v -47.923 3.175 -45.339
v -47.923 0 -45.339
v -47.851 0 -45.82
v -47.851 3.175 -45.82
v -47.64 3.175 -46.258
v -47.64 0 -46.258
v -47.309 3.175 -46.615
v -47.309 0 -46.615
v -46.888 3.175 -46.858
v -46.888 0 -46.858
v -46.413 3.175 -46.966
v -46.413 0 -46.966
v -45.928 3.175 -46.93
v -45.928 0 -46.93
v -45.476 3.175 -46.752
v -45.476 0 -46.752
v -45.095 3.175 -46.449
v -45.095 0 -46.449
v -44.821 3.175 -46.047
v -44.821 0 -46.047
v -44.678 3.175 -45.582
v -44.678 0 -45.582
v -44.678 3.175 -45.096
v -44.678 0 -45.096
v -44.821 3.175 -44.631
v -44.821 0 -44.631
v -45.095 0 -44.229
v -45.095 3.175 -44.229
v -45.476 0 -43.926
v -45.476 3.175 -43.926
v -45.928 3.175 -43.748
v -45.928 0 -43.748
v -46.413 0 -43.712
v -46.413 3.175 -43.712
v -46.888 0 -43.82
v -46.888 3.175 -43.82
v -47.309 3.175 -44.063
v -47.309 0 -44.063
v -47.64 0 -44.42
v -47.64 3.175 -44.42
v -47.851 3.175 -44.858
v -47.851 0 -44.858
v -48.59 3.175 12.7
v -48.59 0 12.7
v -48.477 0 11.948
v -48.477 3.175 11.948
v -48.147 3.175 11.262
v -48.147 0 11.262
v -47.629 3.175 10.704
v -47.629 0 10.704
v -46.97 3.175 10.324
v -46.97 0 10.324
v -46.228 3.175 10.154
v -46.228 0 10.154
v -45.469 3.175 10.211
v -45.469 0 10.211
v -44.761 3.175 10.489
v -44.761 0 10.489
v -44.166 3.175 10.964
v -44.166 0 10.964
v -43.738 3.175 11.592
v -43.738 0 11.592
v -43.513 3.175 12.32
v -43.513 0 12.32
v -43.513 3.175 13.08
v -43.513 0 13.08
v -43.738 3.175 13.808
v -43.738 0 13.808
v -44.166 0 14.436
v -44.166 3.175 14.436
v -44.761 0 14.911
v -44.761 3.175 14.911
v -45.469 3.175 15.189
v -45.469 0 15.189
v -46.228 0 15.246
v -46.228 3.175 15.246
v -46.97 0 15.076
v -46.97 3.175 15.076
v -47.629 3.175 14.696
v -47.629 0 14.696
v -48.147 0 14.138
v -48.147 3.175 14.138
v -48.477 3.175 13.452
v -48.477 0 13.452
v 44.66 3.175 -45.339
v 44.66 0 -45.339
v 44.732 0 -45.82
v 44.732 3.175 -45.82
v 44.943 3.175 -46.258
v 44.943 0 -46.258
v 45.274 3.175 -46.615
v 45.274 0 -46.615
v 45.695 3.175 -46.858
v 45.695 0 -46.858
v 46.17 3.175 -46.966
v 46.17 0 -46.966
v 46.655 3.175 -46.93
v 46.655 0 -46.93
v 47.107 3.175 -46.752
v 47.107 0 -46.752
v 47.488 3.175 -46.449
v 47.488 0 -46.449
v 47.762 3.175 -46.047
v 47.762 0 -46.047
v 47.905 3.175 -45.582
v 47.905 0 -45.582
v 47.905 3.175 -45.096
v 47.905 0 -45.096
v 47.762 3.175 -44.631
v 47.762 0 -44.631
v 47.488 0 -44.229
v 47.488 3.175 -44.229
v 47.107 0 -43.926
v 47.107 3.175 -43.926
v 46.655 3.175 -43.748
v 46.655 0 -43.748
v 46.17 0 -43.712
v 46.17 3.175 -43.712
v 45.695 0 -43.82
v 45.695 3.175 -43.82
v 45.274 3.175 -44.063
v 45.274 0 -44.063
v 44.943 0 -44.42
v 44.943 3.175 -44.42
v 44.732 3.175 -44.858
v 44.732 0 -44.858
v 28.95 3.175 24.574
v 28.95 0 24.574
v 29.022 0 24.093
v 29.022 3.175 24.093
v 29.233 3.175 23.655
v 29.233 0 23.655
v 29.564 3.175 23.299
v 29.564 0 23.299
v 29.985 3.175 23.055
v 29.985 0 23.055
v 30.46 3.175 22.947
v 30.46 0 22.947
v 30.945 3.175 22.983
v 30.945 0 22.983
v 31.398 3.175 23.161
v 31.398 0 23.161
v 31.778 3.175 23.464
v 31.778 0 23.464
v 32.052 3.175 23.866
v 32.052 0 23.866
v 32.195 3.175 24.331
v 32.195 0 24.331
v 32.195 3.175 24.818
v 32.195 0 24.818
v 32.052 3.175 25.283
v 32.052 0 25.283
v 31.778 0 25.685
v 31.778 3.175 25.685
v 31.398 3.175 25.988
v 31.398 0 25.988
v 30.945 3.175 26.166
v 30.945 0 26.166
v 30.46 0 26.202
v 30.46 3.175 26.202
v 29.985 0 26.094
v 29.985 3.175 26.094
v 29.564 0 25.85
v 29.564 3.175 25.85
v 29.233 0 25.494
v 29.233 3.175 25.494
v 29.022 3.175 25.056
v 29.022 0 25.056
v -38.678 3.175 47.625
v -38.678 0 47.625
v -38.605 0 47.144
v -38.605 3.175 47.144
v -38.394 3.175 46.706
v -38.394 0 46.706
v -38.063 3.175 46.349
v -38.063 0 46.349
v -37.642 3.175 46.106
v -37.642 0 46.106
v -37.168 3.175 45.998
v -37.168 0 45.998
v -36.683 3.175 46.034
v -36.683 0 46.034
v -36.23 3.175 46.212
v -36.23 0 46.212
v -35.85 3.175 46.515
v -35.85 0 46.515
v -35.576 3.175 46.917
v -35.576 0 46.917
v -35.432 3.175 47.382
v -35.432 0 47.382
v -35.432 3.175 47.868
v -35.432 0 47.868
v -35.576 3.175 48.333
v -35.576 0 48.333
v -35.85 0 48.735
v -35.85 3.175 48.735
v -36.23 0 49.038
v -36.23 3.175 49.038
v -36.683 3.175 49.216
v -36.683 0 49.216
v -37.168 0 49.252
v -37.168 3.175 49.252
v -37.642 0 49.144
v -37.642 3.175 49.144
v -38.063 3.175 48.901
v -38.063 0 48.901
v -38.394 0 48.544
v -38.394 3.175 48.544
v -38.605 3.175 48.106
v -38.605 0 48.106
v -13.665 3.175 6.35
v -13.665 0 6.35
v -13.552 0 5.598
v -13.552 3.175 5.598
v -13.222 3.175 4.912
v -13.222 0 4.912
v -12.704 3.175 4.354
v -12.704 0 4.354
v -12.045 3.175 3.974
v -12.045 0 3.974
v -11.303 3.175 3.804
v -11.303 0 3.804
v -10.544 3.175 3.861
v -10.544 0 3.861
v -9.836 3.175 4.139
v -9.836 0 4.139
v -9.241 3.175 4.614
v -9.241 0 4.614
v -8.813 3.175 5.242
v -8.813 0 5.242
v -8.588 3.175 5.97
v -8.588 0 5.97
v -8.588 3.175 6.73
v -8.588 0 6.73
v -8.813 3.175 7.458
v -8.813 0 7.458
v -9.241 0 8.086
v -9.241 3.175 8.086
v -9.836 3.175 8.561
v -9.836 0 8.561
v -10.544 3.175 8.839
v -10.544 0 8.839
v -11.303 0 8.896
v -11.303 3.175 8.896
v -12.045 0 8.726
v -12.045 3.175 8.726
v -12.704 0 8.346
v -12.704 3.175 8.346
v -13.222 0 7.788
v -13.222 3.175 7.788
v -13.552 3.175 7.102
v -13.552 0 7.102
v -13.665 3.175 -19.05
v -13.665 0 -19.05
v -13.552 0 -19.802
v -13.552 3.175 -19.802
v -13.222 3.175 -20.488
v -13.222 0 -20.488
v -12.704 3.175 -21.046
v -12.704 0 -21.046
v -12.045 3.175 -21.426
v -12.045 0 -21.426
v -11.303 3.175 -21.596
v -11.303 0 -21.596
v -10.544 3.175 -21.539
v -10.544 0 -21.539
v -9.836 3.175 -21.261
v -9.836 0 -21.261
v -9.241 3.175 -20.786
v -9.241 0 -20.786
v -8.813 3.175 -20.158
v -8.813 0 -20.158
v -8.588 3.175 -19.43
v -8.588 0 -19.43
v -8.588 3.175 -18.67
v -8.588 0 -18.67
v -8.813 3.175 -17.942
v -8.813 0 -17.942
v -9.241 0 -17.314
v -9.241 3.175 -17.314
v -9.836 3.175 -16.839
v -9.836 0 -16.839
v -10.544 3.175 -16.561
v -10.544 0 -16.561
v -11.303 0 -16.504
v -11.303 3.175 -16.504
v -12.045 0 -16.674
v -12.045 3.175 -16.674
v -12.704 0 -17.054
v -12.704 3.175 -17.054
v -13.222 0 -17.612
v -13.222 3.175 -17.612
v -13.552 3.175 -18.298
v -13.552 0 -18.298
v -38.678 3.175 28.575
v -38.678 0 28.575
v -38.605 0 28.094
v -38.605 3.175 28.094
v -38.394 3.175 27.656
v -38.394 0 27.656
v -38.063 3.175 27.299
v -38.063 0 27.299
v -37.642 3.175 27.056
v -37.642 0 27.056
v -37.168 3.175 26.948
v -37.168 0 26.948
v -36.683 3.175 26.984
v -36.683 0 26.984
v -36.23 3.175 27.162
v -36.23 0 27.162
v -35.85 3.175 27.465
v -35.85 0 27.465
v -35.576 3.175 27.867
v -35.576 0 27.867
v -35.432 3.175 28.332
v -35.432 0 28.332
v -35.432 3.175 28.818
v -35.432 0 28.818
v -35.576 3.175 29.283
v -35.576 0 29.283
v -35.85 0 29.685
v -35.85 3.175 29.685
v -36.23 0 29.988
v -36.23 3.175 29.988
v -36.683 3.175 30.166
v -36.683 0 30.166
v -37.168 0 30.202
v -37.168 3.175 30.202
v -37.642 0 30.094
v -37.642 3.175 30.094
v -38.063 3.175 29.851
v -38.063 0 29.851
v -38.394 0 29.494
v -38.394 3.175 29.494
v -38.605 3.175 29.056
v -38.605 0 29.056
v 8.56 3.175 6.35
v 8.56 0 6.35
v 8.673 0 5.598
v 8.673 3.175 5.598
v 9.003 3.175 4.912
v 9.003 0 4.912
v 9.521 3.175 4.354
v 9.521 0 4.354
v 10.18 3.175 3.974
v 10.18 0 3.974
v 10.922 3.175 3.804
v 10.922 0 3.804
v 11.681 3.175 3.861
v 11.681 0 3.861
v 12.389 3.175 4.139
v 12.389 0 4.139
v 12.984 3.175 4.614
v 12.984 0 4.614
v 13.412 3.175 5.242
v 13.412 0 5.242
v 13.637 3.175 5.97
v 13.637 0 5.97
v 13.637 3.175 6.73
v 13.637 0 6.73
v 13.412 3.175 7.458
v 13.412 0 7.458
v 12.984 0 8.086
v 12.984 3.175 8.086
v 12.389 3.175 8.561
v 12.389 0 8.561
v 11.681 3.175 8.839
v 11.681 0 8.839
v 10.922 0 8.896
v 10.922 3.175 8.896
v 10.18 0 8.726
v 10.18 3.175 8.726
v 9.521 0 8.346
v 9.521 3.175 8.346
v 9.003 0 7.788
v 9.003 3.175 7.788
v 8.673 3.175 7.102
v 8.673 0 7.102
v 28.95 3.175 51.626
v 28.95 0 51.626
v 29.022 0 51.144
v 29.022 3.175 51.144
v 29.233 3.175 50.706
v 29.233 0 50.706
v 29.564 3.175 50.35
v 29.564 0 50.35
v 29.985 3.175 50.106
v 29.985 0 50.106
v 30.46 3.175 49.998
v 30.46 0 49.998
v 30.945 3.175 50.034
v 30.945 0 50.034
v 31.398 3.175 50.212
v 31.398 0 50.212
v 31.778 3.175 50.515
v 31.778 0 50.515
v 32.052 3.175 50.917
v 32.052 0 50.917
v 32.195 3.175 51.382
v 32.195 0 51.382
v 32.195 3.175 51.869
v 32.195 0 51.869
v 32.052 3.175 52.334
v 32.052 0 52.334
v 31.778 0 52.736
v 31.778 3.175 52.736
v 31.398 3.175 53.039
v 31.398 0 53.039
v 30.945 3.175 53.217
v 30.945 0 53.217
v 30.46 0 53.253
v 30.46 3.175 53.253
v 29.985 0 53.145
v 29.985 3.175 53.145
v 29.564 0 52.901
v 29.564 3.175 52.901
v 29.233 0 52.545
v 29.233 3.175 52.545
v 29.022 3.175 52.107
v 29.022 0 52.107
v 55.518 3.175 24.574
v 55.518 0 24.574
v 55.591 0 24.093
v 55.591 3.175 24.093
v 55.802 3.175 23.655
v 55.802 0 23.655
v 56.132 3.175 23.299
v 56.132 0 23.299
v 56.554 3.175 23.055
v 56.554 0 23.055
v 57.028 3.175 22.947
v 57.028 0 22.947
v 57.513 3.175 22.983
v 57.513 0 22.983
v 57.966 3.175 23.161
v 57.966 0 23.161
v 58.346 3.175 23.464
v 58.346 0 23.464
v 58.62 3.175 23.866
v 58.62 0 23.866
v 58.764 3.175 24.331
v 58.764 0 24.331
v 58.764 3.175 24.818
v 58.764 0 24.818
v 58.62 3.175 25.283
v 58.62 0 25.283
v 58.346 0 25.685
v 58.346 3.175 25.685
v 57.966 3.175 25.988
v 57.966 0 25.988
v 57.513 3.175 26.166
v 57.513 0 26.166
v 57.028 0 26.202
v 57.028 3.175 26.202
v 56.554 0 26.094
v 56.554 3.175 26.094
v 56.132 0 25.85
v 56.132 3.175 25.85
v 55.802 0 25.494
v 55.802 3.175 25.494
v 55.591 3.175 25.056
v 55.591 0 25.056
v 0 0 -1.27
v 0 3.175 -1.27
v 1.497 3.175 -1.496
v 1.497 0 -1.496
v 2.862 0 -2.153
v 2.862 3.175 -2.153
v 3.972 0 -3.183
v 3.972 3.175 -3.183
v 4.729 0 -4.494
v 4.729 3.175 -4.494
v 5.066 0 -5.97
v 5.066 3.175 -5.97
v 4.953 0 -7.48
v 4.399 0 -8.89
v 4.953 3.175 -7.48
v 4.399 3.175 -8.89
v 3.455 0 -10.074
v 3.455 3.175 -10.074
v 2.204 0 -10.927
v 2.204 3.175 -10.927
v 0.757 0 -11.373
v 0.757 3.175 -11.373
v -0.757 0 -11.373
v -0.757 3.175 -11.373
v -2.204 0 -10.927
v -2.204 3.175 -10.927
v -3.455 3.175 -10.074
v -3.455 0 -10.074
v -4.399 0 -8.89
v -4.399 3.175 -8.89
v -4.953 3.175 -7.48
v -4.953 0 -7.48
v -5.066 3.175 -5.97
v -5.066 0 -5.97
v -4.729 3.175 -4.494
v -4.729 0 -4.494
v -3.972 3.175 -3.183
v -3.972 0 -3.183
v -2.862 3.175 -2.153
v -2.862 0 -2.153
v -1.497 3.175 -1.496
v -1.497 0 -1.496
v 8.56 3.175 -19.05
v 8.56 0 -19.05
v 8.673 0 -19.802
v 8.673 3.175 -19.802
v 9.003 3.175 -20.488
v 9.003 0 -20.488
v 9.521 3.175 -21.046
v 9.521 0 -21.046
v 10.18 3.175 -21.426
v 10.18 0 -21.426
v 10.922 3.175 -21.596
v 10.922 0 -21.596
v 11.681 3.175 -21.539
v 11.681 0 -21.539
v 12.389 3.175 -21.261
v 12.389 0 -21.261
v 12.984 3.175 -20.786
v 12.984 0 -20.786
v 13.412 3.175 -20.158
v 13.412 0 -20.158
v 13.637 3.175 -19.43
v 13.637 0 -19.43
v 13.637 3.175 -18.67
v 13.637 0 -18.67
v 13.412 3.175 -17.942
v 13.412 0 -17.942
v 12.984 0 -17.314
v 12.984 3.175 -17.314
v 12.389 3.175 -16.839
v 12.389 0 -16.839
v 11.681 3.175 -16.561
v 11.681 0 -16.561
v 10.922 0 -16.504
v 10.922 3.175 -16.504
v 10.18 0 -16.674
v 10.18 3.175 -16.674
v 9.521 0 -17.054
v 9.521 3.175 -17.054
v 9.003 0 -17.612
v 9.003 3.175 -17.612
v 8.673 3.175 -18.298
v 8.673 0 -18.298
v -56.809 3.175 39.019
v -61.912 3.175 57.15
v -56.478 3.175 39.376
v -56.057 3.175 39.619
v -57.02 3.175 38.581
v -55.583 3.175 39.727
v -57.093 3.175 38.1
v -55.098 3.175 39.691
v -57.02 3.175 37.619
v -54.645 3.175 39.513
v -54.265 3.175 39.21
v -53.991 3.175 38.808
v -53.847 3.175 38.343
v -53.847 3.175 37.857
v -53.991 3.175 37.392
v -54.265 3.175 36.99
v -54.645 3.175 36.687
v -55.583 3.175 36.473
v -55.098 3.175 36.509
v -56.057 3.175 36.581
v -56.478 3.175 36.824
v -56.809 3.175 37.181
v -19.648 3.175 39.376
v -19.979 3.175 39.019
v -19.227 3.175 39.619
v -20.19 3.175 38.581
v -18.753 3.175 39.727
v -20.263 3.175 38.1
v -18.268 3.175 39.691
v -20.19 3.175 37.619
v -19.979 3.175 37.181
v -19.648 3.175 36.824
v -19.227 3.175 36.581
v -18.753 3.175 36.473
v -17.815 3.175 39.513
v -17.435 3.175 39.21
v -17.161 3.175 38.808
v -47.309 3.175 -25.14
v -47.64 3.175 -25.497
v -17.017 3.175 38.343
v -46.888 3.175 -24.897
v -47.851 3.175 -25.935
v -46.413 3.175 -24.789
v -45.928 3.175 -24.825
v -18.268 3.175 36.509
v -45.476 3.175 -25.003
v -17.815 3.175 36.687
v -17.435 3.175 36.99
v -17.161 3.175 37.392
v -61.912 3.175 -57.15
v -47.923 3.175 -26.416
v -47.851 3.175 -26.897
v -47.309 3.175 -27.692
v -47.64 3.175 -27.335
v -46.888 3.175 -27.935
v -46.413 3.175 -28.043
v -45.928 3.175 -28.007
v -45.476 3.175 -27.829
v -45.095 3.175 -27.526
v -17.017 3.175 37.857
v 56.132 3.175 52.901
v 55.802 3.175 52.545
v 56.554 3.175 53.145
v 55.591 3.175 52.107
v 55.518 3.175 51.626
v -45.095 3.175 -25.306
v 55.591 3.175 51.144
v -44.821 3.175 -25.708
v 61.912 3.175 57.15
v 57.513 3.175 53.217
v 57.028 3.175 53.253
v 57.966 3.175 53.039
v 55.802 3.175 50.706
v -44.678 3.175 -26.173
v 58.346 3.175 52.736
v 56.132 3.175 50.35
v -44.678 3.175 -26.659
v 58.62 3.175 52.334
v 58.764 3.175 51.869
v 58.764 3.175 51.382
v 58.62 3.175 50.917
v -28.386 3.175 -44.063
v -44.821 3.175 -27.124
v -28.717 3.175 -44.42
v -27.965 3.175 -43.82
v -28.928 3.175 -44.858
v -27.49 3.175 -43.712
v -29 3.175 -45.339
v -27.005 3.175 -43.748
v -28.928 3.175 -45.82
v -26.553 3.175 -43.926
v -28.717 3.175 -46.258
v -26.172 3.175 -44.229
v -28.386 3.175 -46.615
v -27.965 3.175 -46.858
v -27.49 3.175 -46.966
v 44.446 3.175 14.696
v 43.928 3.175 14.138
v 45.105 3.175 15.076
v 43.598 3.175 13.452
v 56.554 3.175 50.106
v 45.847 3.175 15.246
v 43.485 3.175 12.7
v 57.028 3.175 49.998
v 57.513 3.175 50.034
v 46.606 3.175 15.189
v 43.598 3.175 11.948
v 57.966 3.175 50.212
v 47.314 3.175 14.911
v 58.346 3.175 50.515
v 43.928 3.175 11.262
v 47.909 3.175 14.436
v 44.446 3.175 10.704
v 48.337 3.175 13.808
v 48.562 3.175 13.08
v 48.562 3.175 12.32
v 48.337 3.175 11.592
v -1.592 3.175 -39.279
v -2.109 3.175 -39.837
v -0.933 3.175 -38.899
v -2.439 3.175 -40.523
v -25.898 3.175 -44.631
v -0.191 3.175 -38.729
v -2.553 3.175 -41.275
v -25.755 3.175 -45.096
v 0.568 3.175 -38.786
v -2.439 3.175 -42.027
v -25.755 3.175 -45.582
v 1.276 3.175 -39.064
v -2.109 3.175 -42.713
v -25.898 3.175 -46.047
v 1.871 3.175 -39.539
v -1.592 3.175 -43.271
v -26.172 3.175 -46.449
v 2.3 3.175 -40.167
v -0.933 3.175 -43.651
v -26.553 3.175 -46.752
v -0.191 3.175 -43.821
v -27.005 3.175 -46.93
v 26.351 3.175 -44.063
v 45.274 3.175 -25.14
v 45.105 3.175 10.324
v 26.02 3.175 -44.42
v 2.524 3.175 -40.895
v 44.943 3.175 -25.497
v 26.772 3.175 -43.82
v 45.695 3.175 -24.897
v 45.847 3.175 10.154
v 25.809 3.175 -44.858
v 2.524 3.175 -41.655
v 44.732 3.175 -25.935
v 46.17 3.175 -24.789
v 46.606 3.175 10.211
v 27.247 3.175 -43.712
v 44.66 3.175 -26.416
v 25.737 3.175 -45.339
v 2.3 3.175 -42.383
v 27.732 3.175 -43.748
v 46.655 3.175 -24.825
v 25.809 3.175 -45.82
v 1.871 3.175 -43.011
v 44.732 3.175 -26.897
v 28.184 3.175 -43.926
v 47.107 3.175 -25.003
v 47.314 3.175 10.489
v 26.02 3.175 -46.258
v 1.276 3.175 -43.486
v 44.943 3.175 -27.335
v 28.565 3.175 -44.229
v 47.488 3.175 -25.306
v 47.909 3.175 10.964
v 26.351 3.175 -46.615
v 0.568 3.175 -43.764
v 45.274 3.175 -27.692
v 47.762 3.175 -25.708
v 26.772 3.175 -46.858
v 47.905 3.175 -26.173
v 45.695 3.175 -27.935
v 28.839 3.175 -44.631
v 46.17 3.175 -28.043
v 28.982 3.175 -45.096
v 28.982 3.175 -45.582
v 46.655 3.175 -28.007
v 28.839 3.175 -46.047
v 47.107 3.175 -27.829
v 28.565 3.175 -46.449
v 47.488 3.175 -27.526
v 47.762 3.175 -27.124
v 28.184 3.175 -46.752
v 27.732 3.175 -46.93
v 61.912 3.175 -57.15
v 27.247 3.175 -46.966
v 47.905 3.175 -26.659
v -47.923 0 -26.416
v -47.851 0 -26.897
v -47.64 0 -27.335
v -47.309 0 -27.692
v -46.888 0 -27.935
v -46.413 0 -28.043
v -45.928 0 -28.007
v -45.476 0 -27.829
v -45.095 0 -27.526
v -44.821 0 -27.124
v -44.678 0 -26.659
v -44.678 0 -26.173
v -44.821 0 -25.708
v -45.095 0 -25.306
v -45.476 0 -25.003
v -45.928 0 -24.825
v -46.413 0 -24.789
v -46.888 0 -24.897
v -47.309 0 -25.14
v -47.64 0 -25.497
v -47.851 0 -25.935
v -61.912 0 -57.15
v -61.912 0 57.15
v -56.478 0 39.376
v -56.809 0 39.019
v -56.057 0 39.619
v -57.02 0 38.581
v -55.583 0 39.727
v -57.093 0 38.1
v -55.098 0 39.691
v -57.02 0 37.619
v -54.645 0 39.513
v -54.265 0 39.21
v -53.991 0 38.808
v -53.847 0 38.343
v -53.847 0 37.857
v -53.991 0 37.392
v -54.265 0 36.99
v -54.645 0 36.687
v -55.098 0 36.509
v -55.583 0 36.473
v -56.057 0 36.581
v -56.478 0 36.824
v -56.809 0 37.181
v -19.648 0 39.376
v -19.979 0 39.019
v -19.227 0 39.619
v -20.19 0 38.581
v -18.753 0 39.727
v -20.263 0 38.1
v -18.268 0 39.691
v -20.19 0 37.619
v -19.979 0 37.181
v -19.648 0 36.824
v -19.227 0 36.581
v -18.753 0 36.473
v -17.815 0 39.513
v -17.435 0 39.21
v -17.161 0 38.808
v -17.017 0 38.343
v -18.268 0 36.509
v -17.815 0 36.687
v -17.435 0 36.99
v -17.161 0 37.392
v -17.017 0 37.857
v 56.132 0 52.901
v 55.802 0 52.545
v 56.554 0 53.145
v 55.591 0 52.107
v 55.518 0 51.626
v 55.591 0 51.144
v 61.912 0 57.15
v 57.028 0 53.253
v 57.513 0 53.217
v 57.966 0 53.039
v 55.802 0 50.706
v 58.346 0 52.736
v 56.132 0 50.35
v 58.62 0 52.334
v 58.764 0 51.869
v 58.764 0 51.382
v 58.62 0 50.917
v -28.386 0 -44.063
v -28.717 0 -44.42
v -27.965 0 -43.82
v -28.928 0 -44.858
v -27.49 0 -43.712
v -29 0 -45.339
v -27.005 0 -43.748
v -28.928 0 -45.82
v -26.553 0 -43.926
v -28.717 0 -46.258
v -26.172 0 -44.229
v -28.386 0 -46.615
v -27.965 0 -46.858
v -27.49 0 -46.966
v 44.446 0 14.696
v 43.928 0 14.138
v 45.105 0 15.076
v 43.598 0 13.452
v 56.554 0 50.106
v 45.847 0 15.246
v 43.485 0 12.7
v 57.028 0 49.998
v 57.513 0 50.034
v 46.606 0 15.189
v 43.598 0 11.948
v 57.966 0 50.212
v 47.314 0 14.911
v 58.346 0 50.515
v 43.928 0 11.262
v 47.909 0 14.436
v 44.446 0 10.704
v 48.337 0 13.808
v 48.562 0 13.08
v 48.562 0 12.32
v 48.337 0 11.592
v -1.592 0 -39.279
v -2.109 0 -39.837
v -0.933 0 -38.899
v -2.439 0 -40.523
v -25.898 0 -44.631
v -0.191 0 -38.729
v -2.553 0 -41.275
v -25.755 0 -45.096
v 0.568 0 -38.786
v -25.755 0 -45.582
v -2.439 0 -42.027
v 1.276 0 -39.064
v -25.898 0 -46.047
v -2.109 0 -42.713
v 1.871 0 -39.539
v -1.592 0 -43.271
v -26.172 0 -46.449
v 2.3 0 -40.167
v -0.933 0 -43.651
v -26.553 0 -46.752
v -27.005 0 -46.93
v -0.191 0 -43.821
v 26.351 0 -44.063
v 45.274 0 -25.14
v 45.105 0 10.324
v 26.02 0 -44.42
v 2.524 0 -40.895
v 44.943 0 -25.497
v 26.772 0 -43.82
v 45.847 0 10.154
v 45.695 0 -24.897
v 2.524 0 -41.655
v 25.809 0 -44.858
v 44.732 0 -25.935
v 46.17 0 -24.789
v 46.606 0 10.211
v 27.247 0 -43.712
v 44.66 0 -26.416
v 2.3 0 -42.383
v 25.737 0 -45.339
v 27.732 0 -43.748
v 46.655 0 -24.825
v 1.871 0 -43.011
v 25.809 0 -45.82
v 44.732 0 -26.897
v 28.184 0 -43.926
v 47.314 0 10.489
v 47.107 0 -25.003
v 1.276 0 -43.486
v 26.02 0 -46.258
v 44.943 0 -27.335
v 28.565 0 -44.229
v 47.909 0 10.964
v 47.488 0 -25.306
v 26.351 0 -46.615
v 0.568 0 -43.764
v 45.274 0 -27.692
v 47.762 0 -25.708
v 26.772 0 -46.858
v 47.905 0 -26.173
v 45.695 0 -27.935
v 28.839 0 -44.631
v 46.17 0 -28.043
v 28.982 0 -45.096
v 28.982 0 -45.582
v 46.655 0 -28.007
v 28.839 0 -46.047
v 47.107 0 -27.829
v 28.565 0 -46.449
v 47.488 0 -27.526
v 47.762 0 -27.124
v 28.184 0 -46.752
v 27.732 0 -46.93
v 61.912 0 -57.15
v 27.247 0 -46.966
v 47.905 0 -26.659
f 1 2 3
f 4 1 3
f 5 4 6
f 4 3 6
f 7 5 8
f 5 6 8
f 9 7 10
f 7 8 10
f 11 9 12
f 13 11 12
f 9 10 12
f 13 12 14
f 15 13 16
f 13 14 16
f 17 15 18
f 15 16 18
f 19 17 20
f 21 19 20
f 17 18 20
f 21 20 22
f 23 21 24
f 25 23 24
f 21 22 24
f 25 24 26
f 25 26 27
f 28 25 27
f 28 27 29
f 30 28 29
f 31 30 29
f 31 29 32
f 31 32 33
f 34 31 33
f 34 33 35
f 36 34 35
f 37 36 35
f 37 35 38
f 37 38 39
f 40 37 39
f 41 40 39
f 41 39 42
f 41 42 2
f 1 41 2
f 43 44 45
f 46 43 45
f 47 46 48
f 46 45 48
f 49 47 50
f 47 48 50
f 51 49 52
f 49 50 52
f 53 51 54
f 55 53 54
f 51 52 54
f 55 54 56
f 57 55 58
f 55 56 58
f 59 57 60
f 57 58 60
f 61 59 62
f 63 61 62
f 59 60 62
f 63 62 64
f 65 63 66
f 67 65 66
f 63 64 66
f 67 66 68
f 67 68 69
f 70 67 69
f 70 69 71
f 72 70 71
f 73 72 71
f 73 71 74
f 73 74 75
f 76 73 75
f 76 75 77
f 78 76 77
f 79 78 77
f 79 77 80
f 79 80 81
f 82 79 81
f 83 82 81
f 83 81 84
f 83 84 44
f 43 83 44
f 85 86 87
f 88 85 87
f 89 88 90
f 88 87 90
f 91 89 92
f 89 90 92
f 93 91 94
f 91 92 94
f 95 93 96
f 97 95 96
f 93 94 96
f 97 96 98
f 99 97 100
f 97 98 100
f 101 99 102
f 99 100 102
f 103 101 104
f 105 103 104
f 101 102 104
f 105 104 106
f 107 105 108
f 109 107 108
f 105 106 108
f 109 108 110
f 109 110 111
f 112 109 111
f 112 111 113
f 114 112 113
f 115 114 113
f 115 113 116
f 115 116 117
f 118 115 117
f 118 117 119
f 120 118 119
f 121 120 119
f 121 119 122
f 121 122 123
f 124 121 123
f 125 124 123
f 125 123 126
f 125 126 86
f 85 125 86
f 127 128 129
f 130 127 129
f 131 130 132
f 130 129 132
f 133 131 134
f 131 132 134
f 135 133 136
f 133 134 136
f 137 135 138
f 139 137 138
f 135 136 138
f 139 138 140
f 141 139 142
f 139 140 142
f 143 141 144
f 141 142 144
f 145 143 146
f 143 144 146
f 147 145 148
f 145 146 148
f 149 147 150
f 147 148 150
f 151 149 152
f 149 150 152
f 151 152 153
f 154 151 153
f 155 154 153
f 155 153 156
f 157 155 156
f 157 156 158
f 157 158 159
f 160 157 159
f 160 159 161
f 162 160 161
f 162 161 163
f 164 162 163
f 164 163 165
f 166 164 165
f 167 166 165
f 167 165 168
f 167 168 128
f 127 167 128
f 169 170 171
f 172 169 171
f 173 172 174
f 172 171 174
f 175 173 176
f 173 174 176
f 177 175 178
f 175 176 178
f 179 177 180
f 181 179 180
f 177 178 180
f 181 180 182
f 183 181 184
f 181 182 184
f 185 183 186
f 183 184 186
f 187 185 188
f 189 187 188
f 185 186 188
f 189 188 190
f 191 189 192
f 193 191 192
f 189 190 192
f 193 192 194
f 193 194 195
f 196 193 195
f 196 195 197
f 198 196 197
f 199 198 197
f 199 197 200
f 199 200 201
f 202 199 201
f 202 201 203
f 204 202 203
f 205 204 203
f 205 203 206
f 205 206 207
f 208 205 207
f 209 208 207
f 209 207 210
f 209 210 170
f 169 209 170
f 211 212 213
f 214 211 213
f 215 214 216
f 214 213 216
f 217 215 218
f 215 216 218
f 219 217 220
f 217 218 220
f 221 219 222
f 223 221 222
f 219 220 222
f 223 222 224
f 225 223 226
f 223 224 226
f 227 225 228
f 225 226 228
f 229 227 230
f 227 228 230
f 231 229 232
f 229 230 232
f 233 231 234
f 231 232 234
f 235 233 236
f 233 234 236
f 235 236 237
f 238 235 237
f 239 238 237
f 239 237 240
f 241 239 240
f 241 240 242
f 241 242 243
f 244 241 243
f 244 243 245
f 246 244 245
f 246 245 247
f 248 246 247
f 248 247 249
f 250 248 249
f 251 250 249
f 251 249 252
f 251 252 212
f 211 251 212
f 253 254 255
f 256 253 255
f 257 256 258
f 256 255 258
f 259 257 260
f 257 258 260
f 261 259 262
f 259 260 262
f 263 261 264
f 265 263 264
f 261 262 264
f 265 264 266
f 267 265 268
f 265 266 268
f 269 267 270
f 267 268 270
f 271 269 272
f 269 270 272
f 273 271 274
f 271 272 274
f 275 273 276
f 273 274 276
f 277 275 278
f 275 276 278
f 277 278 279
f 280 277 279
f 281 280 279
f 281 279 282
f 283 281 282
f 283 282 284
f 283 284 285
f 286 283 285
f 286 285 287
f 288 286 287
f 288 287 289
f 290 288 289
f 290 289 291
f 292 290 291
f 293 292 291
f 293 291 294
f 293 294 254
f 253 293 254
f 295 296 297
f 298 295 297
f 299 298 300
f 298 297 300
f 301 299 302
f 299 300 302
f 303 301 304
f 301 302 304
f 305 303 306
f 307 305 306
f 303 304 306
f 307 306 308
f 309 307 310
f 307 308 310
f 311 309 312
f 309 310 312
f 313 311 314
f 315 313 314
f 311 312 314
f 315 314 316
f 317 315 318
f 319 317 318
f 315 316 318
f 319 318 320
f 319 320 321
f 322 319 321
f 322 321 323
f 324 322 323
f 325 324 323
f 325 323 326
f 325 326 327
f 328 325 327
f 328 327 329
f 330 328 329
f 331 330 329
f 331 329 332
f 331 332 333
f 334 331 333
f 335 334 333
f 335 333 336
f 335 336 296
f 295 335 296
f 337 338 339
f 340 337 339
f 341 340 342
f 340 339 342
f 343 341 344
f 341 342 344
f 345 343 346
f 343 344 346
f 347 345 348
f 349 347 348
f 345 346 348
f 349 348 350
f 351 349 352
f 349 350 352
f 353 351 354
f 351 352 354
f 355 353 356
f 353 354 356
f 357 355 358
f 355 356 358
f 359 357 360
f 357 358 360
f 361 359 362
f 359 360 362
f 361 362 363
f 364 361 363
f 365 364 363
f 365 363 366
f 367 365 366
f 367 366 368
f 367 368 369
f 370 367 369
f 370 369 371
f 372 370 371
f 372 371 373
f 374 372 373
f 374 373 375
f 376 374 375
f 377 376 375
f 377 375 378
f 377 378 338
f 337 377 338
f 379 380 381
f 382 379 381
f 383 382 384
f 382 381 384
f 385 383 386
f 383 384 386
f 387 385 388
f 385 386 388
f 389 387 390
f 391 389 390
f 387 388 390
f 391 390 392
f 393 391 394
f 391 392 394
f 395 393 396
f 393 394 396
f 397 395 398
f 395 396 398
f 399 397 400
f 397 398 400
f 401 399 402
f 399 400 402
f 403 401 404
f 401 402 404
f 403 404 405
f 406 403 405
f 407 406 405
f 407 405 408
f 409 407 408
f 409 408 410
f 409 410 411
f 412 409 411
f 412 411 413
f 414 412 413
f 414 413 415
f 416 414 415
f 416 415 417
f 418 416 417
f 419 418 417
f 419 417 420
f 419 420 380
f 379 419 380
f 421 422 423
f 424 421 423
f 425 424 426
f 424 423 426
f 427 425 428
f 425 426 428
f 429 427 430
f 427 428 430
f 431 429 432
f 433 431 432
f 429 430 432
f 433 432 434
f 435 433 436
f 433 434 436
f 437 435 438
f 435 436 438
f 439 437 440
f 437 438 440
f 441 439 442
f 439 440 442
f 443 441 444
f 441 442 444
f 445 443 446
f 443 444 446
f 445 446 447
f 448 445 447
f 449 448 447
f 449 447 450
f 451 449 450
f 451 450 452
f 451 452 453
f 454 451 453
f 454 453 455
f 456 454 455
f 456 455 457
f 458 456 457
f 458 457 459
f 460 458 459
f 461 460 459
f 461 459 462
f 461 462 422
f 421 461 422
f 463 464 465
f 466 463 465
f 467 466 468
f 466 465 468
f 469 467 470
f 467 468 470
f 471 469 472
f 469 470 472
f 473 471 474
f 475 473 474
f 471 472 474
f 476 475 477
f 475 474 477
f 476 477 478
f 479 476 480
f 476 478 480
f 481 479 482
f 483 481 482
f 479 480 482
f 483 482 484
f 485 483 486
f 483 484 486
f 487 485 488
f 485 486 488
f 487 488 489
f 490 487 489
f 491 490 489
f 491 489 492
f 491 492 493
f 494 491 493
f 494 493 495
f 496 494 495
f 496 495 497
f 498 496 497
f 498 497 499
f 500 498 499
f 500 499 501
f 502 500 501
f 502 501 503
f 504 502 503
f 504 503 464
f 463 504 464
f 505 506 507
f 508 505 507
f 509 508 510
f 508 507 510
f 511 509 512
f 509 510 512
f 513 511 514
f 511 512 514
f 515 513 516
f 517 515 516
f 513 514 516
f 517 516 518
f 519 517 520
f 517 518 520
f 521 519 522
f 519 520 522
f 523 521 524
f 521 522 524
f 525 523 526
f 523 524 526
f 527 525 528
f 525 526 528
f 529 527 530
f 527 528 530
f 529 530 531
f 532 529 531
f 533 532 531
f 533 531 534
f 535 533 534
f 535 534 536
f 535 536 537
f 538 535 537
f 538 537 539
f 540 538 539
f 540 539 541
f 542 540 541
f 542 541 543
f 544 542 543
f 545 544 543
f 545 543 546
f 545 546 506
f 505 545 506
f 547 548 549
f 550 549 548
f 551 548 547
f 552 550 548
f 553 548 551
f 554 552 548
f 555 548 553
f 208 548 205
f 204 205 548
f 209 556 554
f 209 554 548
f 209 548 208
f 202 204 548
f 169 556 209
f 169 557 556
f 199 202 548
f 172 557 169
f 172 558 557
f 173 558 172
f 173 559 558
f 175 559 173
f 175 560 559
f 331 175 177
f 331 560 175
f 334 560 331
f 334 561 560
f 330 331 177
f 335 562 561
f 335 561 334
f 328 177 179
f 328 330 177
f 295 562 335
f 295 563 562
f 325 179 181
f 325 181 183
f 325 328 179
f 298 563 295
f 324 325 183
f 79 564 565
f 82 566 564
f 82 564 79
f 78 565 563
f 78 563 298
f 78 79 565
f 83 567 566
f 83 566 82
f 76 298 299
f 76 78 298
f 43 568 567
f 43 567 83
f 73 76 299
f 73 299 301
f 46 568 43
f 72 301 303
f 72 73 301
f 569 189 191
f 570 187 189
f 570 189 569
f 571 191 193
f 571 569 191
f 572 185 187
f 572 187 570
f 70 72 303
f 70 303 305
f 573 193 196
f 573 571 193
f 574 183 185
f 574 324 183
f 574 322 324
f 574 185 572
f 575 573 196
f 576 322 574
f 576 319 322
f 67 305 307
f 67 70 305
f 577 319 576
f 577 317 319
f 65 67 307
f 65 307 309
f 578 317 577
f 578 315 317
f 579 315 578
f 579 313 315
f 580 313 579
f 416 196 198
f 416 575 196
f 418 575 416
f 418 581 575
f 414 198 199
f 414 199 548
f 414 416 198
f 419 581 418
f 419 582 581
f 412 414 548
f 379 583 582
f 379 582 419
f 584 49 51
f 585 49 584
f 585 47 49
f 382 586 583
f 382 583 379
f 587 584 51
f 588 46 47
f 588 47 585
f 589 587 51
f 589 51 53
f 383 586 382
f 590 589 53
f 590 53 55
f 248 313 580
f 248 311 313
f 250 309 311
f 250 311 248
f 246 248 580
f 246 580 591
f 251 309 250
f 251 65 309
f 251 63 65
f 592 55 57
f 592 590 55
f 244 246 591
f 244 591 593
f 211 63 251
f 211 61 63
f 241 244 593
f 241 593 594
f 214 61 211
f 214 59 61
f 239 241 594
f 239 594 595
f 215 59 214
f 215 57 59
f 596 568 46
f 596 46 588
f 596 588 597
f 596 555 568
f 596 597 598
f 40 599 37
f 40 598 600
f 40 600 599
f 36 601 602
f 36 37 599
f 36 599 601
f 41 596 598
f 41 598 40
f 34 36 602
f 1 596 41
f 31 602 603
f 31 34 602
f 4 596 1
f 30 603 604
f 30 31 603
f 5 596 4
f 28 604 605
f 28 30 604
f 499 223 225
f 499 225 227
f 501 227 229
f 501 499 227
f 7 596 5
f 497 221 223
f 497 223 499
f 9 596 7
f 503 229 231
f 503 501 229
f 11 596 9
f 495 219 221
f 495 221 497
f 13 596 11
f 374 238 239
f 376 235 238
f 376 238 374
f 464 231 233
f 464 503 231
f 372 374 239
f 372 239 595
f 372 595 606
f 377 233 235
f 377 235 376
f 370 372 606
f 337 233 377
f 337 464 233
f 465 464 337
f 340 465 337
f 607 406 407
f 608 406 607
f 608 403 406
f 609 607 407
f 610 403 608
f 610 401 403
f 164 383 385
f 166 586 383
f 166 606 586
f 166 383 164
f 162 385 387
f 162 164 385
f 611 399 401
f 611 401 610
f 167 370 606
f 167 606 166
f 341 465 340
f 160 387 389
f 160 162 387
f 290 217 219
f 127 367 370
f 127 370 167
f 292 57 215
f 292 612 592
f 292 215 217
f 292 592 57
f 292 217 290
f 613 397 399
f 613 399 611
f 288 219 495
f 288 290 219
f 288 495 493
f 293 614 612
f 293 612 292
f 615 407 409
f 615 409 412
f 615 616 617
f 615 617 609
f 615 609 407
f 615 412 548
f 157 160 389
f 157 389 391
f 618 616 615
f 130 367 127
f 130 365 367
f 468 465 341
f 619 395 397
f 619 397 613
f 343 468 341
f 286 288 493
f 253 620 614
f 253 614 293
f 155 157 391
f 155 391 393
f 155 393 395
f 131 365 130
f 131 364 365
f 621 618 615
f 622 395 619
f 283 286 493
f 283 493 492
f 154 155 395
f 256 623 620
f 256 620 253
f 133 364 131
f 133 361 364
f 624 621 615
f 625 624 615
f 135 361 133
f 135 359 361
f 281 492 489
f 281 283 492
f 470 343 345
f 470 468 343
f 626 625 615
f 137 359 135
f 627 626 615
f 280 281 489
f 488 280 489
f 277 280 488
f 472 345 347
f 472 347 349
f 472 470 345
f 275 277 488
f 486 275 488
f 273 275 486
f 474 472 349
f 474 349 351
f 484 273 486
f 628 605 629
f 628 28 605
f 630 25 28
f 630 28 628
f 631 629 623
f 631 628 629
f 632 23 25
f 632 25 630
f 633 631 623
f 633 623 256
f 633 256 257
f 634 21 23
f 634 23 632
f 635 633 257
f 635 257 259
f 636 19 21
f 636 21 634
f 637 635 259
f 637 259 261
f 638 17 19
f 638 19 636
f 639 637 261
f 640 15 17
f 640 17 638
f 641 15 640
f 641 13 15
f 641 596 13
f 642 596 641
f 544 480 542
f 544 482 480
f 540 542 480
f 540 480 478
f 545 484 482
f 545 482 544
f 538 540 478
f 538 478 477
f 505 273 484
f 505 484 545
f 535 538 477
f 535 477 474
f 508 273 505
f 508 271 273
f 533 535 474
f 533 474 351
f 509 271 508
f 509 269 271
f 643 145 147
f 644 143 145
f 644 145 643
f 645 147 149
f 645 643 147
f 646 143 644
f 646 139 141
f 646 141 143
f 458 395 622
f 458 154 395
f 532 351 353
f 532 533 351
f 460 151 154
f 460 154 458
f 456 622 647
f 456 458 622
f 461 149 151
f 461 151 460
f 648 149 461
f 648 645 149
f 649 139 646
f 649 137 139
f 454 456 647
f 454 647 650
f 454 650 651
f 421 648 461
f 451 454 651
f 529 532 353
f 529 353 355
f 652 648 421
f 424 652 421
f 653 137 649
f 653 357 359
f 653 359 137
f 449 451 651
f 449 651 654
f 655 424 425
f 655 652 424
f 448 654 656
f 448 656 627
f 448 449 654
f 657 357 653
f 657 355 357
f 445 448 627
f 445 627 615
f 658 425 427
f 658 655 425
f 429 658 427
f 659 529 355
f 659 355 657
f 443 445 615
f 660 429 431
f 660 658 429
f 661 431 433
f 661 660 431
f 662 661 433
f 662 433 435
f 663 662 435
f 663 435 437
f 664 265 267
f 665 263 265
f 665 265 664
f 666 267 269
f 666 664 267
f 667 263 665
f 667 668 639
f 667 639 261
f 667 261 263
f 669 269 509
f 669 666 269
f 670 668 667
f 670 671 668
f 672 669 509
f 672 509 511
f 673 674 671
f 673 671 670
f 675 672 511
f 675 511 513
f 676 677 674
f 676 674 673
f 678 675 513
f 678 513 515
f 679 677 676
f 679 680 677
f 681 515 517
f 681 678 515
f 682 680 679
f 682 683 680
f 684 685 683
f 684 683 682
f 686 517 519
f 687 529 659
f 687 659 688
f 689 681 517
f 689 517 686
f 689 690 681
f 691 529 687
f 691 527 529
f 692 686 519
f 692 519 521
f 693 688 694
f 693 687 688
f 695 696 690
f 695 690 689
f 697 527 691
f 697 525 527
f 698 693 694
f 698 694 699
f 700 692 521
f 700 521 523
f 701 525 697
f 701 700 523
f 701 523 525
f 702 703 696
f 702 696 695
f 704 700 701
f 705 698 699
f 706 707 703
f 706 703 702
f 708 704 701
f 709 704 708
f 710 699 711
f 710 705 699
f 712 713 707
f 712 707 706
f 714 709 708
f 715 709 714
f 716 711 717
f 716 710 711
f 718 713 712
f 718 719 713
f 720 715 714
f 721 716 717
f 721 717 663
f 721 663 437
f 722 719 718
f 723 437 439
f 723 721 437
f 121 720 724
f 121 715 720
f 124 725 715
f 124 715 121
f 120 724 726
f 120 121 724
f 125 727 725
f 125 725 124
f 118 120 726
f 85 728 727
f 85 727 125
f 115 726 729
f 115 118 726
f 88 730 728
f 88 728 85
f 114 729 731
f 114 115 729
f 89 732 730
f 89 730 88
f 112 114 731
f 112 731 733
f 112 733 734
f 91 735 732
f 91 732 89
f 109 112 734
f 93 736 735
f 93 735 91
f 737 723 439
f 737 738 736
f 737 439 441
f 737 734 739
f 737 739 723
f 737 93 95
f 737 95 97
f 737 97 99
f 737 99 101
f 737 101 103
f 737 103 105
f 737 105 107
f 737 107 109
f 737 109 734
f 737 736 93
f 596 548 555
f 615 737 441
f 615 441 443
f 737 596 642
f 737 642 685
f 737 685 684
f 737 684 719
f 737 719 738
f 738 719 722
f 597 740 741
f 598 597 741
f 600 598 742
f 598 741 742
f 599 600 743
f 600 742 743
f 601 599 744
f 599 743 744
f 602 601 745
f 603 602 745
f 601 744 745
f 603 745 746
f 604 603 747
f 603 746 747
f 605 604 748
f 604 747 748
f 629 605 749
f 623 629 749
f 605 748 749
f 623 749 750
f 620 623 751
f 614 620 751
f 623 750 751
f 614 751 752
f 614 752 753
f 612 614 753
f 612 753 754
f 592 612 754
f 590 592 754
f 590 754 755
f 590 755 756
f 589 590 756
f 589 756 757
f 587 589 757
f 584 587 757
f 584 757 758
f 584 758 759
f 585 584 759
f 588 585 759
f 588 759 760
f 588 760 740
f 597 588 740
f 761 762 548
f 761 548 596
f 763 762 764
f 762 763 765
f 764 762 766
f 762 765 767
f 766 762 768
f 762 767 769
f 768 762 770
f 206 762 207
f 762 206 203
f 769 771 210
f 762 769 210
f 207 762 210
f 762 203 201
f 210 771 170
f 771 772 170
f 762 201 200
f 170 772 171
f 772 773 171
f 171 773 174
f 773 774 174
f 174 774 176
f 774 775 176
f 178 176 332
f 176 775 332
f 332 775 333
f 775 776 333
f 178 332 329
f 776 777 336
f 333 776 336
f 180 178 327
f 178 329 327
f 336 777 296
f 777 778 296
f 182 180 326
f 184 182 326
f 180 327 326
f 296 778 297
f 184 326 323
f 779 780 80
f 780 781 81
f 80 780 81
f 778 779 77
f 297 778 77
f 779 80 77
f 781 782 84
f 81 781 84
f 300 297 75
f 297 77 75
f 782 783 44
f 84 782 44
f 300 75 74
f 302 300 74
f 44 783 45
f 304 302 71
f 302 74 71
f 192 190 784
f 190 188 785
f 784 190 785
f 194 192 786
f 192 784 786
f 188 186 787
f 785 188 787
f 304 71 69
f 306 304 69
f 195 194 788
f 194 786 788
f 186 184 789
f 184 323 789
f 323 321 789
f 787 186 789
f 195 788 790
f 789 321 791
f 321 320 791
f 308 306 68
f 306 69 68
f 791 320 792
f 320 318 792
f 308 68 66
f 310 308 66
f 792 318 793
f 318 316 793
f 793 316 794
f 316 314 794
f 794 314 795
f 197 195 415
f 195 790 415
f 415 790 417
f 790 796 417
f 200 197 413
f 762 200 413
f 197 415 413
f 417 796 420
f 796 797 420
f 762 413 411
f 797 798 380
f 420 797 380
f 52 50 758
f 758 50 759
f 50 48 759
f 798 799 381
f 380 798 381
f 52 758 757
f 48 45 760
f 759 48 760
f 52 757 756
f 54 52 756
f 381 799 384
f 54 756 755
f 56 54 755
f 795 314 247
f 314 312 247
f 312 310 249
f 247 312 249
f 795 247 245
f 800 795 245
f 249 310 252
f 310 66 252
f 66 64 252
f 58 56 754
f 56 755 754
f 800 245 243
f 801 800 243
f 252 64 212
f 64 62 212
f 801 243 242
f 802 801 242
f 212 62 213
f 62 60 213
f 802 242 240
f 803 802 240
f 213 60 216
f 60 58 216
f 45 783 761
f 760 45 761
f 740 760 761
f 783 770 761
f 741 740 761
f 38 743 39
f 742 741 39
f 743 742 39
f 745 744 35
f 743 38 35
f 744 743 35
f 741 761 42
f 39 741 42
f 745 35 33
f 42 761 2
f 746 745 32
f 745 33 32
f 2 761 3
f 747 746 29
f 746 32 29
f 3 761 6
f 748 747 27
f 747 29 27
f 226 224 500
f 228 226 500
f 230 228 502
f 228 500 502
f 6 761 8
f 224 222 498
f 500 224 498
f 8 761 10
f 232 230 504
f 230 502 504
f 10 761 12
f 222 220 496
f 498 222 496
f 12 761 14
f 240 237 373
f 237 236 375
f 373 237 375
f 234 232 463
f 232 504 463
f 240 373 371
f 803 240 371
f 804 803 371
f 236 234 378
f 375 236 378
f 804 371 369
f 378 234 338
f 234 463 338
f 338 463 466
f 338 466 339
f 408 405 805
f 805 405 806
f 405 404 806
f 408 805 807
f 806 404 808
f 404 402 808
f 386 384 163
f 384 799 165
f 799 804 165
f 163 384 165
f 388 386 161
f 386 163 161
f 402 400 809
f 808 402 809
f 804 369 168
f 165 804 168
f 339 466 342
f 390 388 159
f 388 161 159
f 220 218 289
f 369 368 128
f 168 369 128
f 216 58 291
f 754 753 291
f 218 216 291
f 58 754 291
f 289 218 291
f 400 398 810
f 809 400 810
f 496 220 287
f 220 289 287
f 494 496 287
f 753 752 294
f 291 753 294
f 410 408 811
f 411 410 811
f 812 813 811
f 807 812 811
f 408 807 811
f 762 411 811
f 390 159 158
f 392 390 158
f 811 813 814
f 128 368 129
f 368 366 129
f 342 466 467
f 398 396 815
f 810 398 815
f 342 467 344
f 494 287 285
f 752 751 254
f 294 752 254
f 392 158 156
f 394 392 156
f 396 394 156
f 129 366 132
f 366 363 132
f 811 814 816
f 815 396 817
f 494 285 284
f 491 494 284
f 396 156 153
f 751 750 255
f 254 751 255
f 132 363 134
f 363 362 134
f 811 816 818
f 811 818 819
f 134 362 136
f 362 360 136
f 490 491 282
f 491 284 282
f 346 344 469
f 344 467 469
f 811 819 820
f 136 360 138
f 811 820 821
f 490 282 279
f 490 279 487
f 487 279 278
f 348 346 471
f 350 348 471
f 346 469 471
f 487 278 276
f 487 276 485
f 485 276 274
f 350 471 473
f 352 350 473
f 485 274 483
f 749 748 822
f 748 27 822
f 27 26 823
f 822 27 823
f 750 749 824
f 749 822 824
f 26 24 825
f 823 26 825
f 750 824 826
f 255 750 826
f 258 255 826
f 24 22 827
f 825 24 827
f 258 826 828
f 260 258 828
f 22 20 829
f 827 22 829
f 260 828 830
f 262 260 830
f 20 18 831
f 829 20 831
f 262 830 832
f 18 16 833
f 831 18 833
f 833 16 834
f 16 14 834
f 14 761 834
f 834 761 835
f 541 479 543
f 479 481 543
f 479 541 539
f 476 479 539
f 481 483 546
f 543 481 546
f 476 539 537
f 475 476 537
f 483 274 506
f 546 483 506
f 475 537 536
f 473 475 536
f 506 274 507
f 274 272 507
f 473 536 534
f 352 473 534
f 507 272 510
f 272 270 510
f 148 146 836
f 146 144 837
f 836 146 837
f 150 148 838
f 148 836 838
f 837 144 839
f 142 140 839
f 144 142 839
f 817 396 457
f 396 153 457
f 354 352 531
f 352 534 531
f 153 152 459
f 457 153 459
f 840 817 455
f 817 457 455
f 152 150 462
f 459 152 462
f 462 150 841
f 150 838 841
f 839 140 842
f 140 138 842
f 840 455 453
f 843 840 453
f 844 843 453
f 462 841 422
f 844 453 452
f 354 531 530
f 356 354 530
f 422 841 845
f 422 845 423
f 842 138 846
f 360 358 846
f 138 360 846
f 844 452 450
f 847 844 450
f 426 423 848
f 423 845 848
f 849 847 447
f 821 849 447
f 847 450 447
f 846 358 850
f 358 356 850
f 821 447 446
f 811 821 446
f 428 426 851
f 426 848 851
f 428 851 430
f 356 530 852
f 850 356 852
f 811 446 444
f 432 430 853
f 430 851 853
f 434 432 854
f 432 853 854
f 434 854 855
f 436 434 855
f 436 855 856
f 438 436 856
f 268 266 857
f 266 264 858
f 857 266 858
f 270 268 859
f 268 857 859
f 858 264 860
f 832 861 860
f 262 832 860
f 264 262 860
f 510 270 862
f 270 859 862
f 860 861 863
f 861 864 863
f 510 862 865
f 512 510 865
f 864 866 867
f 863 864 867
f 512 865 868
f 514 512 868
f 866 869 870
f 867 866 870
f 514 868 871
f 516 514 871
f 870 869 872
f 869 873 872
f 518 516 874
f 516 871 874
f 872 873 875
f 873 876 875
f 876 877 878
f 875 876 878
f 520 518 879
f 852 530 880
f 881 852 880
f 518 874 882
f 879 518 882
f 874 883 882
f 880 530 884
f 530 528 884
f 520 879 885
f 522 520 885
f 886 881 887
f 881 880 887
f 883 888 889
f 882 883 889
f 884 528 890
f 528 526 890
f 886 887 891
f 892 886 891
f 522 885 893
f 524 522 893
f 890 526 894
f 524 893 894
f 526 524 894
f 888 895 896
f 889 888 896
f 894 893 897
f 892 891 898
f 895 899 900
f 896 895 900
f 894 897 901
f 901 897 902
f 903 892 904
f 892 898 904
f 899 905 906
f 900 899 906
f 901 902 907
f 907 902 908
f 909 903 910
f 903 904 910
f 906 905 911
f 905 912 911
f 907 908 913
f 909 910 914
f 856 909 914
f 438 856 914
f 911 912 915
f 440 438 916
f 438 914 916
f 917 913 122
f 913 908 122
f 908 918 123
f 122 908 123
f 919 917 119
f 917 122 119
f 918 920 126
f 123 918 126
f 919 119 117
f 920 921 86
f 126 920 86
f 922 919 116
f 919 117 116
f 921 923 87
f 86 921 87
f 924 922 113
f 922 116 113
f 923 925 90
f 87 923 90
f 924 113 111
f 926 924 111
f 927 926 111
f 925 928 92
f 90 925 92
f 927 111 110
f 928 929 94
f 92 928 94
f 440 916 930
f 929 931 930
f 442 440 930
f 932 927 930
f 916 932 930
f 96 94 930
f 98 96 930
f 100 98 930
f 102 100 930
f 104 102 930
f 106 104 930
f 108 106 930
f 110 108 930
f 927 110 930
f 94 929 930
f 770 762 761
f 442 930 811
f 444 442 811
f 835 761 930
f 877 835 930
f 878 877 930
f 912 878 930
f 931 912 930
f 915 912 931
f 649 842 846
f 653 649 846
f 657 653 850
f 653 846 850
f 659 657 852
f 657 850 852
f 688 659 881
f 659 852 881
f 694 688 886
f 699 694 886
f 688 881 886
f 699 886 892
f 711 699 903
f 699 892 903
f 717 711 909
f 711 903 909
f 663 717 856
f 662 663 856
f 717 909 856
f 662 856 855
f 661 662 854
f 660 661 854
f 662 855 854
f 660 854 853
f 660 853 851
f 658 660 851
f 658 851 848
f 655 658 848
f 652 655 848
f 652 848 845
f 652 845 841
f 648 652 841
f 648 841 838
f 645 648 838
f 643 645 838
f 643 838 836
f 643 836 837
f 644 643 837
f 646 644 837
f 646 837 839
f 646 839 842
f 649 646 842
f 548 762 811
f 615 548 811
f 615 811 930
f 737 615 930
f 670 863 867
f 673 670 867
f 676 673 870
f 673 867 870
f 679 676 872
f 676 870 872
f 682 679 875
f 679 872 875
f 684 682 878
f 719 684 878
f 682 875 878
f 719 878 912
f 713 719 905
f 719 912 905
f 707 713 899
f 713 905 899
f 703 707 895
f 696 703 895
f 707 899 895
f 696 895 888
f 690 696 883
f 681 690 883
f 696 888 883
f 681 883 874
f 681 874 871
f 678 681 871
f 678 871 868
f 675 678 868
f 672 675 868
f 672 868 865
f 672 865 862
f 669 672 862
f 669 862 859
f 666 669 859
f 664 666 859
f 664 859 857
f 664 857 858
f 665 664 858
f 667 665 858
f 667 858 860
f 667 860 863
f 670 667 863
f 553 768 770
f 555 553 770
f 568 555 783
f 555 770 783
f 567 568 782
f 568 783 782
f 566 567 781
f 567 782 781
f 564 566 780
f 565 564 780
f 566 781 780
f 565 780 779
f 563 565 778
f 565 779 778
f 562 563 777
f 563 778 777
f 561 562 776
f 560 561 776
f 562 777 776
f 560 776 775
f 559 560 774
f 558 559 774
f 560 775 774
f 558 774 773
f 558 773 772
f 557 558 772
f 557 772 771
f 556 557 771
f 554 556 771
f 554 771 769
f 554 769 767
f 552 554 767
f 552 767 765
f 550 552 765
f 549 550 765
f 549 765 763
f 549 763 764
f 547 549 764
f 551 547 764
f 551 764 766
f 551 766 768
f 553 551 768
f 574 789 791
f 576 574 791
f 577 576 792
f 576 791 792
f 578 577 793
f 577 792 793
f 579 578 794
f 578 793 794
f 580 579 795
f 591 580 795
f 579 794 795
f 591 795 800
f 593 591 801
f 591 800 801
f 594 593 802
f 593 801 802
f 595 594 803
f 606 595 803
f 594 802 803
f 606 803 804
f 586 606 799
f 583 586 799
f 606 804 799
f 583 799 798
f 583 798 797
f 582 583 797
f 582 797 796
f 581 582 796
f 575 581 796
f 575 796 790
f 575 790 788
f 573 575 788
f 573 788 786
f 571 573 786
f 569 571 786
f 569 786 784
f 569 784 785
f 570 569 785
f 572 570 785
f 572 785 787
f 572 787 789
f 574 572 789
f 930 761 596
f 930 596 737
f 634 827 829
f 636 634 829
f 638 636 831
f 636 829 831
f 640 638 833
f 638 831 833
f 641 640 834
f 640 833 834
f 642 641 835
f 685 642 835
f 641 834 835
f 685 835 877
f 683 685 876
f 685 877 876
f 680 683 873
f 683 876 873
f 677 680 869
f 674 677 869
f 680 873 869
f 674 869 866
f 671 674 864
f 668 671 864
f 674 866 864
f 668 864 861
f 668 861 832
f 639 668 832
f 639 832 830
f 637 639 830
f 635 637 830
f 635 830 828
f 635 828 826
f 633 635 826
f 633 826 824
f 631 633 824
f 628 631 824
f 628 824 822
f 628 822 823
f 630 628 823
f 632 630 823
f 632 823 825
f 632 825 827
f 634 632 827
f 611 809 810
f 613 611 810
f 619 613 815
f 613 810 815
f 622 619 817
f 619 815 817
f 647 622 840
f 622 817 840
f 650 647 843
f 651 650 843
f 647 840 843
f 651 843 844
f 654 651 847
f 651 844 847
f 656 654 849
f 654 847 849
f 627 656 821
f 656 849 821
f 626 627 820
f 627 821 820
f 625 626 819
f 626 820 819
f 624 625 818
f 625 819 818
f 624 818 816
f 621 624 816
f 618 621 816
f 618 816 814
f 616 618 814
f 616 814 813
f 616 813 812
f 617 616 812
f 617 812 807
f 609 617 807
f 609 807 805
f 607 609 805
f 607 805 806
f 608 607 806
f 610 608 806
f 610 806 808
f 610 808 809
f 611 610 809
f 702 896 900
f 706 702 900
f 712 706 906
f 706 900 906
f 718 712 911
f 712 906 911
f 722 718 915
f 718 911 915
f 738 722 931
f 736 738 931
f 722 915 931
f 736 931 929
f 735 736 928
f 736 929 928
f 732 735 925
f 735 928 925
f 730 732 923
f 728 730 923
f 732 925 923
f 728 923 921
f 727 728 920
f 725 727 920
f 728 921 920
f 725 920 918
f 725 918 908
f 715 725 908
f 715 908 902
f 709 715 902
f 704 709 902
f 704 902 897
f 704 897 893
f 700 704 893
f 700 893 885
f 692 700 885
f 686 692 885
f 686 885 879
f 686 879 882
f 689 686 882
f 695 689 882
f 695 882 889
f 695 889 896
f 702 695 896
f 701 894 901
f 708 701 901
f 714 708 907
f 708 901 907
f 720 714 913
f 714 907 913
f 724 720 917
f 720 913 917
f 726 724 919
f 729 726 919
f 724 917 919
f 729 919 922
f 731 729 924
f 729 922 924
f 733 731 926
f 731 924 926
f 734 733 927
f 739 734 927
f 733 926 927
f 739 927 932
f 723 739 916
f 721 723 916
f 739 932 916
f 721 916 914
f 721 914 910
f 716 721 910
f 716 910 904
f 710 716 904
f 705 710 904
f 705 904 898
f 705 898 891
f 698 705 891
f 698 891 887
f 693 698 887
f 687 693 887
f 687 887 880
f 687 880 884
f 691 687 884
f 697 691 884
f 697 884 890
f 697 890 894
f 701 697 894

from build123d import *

# Parameters (mm, degrees)
SKETCH1_W                                     = 123.825
SKETCH1_H                                     = 114.3
PLATE_DEPTH                                   = 3.175
SKETCH2_R                                     = 5.08
FORCE_SENSOR_POST_HOLE_DEPTH                  = 85.317025453
GEARBOX_MOUNT_HOLES_4_CLEARANCE_D             = 3.2639
BEARING_MOUNT_HOLES_4_CLEARANCE_D             = 3.2639
BEARING_MOUNT_HOLES_4_CLEARANCE_DEPTH         = 7.62
BEARING_MOUNT_HOLES_4_CLEARANCE_TIP           = 0.980574487
FORCE_SENSOR_FOUNDATION_HOLES_10_CLEARA_D     = 5.1054
FORCE_SENSOR_FOUNDATION_HOLES_10_CLEARA_DEPTH = 7.62
FORCE_SENSOR_FOUNDATION_HOLES_10_CLEARA_TIP   = 1.533816902
BALL_CASTER_MOUNT_HOLES_4_CLEARANCE_D         = 3.2639
TOP_PLATE_GUIDE_HOLES_10_CLEARANCE_D          = 5.1054


with BuildPart() as part:
    # Sketch1 → Plate (new body)
    with BuildSketch(Plane(origin=(0, 0, 0), x_dir=(1, 0, 0), z_dir=(0, 1, 0))):
        Rectangle(SKETCH1_W, SKETCH1_H)
    extrude(amount=PLATE_DEPTH)

    # Sketch2 → Force Sensor Post Hole (cut, through all)
    with BuildSketch(Plane(origin=(0, 3.175, 0), x_dir=(1, 0, 0), z_dir=(0, 1, 0))):
        with Locations(Location((0, 6.35, 0), (0, 0, 270))):
            Circle(SKETCH2_R)
    extrude(amount=-FORCE_SENSOR_POST_HOLE_DEPTH, mode=Mode.SUBTRACT)

    # Gearbox Mount Holes (#4 clearance) (through all)
    with Locations(Plane(origin=(0, 3.175, 0), x_dir=(1, 0, 0), z_dir=(0, 1, 0))):
        with Locations((-55.4609, -38.1), (-37.0459, -28.575), (-18.6309, -38.1), (-37.0459, -47.625)):
            Hole(GEARBOX_MOUNT_HOLES_4_CLEARANCE_D / 2)

    # Bearing Mount Holes (#4 clearance)
    with Locations(Plane(origin=(0, 3.175, 0), x_dir=(1, 0, 0), z_dir=(0, 1, 0))):
        with Locations((57.15, -24.5745), (30.5816, -51.6255), (30.5816, -24.5745), (57.15, -51.6255)):
            Hole(BEARING_MOUNT_HOLES_4_CLEARANCE_D / 2, depth=BEARING_MOUNT_HOLES_4_CLEARANCE_DEPTH)
            with Locations((0, 0, -(BEARING_MOUNT_HOLES_4_CLEARANCE_DEPTH + BEARING_MOUNT_HOLES_4_CLEARANCE_TIP / 2))):  # 118° drill point
                Cone(0, BEARING_MOUNT_HOLES_4_CLEARANCE_D / 2, BEARING_MOUNT_HOLES_4_CLEARANCE_TIP, mode=Mode.SUBTRACT)

    # Force Sensor Foundation Holes (#10 clearance)
    with Locations(Plane(origin=(0, 3.175, 0), x_dir=(1, 0, 0), z_dir=(0, 1, 0))):
        with Locations((-11.1125, -6.35), (11.1125, 19.05), (-11.1125, 19.05), (11.1125, -6.35), (0, 6.35)):
            Hole(FORCE_SENSOR_FOUNDATION_HOLES_10_CLEARA_D / 2, depth=FORCE_SENSOR_FOUNDATION_HOLES_10_CLEARA_DEPTH)
            with Locations((0, 0, -(FORCE_SENSOR_FOUNDATION_HOLES_10_CLEARA_DEPTH + FORCE_SENSOR_FOUNDATION_HOLES_10_CLEARA_TIP / 2))):  # 118° drill point
                Cone(0, FORCE_SENSOR_FOUNDATION_HOLES_10_CLEARA_D / 2, FORCE_SENSOR_FOUNDATION_HOLES_10_CLEARA_TIP, mode=Mode.SUBTRACT)

    # Ball Caster Mount Holes (#4 clearance) (through all)
    with Locations(Plane(origin=(0, 3.175, 0), x_dir=(1, 0, 0), z_dir=(0, 1, 0))):
        with Locations((-46.2915, 45.339), (-46.2915, 26.416), (-27.3685, 45.339), (46.2915, 45.339), (46.2915, 26.416), (27.3685, 45.339)):
            Hole(BALL_CASTER_MOUNT_HOLES_4_CLEARANCE_D / 2)

    # Top Plate Guide Holes (#10 clearance) (through all)
    with Locations(Plane(origin=(0, 3.175, 0), x_dir=(1, 0, 0), z_dir=(0, 1, 0))):
        with Locations((-46.0375, -12.7), (46.0375, -12.7), (0, 41.275)):
            Hole(TOP_PLATE_GUIDE_HOLES_10_CLEARANCE_D / 2)


solid = part.part
